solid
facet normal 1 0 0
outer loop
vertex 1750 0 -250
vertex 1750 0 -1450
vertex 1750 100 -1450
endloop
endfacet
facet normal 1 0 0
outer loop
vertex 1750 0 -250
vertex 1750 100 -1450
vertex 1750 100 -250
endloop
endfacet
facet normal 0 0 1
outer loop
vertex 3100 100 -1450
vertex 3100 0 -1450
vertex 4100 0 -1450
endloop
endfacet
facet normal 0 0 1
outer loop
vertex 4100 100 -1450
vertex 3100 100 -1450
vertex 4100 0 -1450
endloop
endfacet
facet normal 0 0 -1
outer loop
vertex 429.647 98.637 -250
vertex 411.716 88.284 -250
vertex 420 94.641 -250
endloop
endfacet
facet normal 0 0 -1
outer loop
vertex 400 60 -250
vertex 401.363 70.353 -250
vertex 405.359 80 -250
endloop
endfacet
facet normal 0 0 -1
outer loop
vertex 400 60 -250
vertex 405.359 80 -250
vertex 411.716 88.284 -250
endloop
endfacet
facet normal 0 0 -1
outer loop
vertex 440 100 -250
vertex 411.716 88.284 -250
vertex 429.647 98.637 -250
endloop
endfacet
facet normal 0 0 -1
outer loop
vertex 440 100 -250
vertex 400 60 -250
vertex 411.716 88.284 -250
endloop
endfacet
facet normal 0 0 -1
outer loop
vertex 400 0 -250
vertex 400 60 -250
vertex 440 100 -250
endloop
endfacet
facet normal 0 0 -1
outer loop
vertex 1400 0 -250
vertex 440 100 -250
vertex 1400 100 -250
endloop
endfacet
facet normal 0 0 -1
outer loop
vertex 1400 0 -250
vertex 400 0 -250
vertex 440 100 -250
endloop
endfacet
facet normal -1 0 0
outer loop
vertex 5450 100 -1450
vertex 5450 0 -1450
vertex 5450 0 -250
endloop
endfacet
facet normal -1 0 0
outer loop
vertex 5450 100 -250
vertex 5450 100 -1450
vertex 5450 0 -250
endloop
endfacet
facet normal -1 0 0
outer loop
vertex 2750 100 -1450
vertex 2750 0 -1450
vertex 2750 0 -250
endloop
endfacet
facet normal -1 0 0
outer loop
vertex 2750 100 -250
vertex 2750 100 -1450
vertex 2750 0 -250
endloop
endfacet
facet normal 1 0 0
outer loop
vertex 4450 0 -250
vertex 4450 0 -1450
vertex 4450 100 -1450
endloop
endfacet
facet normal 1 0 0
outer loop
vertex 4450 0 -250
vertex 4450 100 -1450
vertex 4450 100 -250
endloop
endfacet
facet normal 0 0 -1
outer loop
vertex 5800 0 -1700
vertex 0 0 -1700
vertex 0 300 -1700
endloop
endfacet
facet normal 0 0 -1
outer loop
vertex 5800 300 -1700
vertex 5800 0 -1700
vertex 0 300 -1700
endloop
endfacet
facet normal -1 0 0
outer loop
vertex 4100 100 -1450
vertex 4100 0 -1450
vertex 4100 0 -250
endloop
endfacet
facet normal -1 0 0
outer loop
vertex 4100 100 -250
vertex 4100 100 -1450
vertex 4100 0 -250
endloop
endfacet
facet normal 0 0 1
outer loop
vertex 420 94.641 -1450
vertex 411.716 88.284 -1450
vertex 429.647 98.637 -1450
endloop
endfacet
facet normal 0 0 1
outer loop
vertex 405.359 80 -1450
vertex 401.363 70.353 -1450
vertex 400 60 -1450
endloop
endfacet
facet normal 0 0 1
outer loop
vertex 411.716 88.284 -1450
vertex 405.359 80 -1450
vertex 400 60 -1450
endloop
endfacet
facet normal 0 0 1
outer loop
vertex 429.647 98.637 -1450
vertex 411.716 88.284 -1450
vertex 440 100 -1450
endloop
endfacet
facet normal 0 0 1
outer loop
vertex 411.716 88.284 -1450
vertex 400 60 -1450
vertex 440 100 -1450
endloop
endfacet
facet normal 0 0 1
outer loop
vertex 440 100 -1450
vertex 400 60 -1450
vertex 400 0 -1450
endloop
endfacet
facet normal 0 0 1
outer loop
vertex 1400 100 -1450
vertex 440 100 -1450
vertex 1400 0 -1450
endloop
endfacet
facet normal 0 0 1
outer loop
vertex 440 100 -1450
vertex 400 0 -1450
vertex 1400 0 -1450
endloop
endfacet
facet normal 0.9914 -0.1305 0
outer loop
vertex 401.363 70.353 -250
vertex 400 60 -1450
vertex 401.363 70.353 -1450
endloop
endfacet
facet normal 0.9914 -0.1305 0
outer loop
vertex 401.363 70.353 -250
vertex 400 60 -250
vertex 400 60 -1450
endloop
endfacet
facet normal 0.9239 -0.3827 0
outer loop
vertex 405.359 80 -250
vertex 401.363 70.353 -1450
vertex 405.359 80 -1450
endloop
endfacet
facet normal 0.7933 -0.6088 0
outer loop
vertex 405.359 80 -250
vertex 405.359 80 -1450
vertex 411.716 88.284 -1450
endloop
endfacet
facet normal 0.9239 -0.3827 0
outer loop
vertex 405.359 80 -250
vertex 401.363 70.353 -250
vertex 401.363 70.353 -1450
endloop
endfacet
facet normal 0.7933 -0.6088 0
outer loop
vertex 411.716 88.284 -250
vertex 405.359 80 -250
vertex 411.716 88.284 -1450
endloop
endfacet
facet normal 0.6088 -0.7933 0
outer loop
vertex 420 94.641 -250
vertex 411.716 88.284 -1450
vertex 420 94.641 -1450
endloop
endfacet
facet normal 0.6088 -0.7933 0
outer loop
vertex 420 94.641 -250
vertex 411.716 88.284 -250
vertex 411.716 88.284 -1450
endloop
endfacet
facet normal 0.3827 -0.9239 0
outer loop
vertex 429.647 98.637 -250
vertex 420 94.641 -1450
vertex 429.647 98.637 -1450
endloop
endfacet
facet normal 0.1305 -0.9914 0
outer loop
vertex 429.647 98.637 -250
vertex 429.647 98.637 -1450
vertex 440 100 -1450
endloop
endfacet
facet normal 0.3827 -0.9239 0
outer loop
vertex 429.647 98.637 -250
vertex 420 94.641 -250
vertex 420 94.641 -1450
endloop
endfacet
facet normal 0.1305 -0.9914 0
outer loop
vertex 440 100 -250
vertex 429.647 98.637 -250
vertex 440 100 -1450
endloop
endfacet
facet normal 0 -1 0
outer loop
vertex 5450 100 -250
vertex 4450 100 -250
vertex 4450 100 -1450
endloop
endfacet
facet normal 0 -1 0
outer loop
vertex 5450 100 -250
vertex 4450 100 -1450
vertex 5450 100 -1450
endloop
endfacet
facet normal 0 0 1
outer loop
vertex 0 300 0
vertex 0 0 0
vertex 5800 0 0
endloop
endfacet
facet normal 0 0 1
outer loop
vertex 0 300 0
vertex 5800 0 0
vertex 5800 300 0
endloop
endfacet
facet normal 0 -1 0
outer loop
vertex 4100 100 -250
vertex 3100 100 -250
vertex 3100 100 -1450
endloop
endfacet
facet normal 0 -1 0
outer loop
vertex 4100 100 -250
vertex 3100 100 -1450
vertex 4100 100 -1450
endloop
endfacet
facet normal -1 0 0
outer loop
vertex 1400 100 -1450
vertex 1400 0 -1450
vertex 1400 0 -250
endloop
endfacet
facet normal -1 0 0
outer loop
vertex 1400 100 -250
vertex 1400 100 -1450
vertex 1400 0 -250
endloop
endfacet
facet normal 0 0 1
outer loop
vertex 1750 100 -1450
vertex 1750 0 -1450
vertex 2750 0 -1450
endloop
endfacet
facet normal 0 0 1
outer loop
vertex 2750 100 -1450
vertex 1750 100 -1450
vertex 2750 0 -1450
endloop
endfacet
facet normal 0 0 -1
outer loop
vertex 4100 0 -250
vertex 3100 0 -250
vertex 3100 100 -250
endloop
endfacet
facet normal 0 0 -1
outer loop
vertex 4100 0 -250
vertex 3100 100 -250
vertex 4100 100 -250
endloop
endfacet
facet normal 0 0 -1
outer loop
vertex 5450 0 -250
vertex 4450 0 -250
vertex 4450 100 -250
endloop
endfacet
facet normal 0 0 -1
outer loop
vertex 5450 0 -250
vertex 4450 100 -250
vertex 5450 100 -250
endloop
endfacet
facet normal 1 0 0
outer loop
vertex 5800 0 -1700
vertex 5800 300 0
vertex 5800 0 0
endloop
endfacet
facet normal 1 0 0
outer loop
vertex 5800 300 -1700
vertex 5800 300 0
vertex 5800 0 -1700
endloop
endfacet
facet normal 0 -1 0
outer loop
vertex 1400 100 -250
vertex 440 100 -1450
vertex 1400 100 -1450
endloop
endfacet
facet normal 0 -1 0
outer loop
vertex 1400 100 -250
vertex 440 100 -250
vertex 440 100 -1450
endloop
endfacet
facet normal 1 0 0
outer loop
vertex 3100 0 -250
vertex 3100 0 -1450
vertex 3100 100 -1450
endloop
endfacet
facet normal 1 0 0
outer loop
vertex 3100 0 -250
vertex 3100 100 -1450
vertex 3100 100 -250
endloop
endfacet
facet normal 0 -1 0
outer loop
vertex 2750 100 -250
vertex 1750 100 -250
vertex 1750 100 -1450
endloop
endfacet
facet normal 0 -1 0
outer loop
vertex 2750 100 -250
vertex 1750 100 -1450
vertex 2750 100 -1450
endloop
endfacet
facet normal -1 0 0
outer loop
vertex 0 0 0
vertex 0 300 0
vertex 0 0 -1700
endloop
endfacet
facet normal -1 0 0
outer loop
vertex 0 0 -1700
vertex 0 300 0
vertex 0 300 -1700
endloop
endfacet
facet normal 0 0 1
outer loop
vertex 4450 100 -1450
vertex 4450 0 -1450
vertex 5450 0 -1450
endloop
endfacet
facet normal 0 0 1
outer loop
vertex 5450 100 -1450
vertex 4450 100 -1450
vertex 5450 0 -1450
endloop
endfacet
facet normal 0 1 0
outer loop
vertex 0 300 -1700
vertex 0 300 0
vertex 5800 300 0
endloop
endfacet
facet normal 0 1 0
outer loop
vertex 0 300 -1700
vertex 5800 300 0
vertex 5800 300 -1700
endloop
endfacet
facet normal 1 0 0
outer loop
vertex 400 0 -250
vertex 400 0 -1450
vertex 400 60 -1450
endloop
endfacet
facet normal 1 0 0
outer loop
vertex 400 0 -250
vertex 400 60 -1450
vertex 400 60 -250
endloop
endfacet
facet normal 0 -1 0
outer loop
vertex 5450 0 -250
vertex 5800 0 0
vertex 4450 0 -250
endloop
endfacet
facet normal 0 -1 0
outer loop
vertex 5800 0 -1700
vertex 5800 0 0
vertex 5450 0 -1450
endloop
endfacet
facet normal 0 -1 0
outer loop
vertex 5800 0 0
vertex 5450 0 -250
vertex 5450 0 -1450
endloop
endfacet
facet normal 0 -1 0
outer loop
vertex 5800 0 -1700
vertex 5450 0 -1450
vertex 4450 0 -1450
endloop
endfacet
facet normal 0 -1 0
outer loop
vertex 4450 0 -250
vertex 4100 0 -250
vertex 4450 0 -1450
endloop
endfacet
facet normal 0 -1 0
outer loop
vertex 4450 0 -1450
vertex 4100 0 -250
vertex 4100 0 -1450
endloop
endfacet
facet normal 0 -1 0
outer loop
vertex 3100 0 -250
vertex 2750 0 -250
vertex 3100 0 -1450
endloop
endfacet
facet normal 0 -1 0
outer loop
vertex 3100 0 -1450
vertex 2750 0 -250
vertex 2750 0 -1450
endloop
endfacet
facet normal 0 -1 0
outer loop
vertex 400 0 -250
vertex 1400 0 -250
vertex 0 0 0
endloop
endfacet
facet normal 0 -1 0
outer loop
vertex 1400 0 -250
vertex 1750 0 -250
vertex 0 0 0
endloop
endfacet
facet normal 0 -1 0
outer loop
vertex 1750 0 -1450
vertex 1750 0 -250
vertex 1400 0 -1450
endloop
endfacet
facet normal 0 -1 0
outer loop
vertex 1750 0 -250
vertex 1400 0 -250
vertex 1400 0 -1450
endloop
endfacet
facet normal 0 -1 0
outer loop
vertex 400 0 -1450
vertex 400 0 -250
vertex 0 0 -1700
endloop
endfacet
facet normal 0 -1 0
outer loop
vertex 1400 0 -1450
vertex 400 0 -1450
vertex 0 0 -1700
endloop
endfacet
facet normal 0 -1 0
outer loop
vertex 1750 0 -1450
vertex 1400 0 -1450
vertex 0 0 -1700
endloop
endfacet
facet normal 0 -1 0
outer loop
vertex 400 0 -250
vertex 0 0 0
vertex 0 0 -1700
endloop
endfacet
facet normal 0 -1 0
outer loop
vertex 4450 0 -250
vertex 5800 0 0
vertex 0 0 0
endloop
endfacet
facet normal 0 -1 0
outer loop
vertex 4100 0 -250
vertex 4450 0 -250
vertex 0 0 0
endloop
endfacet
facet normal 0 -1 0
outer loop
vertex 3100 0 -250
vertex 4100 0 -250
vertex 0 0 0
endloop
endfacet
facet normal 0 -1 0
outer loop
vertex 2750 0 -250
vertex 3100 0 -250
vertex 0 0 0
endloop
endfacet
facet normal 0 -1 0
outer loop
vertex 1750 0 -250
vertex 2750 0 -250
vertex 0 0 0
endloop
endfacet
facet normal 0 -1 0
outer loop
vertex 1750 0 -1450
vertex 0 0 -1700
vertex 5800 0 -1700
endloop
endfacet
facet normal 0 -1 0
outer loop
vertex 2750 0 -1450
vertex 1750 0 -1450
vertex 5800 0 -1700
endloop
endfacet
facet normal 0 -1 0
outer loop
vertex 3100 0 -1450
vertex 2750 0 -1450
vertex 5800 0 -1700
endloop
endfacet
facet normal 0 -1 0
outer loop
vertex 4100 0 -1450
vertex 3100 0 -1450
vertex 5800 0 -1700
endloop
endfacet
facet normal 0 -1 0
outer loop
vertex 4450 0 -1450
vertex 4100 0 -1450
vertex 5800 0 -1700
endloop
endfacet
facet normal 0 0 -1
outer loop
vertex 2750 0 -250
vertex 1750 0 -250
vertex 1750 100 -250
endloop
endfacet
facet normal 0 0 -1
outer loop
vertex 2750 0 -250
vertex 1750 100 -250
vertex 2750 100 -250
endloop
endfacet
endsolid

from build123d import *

# Parameters (mm, degrees)
SKETCH_1_W          = 1700
SKETCH_1_H          = 300
EXTRUDE_1_DEPTH     = 5800
SKETCH_2_W          = 1000
SKETCH_2_H          = 1200
CUT_EXTRUDE_1_DEPTH = 100
FILLET_1_R          = 40


with BuildPart() as part:
    # Эскиз1 → Бобышка-Вытянуть1 (new body)
    with BuildSketch(Plane(origin=(0, 0, 0), x_dir=(0, 0, -1), z_dir=(1, 0, 0))):
        with Locations((850, 150)):
            Rectangle(SKETCH_1_W, SKETCH_1_H)
    extrude(amount=EXTRUDE_1_DEPTH)

    # Эскиз2 → Вырез-Вытянуть1 (cut)
    with BuildSketch(Plane.XZ):
        with Locations((2250, -850)):
            Rectangle(SKETCH_2_W, SKETCH_2_H)
        with Locations((900, -850)):
            Rectangle(SKETCH_2_W, SKETCH_2_H)
        with Locations((3600, -850)):
            Rectangle(SKETCH_2_W, SKETCH_2_H)
        with Locations((4950, -850)):
            Rectangle(SKETCH_2_W, SKETCH_2_H)
    extrude(amount=-CUT_EXTRUDE_1_DEPTH, mode=Mode.SUBTRACT)

    # Скругление1
    fillet_1_edges = [part.edges().sort_by_distance(p)[0] for p in [
        (400, 100, -850),
    ]]
    fillet(fillet_1_edges, radius=FILLET_1_R)


solid = part.part
